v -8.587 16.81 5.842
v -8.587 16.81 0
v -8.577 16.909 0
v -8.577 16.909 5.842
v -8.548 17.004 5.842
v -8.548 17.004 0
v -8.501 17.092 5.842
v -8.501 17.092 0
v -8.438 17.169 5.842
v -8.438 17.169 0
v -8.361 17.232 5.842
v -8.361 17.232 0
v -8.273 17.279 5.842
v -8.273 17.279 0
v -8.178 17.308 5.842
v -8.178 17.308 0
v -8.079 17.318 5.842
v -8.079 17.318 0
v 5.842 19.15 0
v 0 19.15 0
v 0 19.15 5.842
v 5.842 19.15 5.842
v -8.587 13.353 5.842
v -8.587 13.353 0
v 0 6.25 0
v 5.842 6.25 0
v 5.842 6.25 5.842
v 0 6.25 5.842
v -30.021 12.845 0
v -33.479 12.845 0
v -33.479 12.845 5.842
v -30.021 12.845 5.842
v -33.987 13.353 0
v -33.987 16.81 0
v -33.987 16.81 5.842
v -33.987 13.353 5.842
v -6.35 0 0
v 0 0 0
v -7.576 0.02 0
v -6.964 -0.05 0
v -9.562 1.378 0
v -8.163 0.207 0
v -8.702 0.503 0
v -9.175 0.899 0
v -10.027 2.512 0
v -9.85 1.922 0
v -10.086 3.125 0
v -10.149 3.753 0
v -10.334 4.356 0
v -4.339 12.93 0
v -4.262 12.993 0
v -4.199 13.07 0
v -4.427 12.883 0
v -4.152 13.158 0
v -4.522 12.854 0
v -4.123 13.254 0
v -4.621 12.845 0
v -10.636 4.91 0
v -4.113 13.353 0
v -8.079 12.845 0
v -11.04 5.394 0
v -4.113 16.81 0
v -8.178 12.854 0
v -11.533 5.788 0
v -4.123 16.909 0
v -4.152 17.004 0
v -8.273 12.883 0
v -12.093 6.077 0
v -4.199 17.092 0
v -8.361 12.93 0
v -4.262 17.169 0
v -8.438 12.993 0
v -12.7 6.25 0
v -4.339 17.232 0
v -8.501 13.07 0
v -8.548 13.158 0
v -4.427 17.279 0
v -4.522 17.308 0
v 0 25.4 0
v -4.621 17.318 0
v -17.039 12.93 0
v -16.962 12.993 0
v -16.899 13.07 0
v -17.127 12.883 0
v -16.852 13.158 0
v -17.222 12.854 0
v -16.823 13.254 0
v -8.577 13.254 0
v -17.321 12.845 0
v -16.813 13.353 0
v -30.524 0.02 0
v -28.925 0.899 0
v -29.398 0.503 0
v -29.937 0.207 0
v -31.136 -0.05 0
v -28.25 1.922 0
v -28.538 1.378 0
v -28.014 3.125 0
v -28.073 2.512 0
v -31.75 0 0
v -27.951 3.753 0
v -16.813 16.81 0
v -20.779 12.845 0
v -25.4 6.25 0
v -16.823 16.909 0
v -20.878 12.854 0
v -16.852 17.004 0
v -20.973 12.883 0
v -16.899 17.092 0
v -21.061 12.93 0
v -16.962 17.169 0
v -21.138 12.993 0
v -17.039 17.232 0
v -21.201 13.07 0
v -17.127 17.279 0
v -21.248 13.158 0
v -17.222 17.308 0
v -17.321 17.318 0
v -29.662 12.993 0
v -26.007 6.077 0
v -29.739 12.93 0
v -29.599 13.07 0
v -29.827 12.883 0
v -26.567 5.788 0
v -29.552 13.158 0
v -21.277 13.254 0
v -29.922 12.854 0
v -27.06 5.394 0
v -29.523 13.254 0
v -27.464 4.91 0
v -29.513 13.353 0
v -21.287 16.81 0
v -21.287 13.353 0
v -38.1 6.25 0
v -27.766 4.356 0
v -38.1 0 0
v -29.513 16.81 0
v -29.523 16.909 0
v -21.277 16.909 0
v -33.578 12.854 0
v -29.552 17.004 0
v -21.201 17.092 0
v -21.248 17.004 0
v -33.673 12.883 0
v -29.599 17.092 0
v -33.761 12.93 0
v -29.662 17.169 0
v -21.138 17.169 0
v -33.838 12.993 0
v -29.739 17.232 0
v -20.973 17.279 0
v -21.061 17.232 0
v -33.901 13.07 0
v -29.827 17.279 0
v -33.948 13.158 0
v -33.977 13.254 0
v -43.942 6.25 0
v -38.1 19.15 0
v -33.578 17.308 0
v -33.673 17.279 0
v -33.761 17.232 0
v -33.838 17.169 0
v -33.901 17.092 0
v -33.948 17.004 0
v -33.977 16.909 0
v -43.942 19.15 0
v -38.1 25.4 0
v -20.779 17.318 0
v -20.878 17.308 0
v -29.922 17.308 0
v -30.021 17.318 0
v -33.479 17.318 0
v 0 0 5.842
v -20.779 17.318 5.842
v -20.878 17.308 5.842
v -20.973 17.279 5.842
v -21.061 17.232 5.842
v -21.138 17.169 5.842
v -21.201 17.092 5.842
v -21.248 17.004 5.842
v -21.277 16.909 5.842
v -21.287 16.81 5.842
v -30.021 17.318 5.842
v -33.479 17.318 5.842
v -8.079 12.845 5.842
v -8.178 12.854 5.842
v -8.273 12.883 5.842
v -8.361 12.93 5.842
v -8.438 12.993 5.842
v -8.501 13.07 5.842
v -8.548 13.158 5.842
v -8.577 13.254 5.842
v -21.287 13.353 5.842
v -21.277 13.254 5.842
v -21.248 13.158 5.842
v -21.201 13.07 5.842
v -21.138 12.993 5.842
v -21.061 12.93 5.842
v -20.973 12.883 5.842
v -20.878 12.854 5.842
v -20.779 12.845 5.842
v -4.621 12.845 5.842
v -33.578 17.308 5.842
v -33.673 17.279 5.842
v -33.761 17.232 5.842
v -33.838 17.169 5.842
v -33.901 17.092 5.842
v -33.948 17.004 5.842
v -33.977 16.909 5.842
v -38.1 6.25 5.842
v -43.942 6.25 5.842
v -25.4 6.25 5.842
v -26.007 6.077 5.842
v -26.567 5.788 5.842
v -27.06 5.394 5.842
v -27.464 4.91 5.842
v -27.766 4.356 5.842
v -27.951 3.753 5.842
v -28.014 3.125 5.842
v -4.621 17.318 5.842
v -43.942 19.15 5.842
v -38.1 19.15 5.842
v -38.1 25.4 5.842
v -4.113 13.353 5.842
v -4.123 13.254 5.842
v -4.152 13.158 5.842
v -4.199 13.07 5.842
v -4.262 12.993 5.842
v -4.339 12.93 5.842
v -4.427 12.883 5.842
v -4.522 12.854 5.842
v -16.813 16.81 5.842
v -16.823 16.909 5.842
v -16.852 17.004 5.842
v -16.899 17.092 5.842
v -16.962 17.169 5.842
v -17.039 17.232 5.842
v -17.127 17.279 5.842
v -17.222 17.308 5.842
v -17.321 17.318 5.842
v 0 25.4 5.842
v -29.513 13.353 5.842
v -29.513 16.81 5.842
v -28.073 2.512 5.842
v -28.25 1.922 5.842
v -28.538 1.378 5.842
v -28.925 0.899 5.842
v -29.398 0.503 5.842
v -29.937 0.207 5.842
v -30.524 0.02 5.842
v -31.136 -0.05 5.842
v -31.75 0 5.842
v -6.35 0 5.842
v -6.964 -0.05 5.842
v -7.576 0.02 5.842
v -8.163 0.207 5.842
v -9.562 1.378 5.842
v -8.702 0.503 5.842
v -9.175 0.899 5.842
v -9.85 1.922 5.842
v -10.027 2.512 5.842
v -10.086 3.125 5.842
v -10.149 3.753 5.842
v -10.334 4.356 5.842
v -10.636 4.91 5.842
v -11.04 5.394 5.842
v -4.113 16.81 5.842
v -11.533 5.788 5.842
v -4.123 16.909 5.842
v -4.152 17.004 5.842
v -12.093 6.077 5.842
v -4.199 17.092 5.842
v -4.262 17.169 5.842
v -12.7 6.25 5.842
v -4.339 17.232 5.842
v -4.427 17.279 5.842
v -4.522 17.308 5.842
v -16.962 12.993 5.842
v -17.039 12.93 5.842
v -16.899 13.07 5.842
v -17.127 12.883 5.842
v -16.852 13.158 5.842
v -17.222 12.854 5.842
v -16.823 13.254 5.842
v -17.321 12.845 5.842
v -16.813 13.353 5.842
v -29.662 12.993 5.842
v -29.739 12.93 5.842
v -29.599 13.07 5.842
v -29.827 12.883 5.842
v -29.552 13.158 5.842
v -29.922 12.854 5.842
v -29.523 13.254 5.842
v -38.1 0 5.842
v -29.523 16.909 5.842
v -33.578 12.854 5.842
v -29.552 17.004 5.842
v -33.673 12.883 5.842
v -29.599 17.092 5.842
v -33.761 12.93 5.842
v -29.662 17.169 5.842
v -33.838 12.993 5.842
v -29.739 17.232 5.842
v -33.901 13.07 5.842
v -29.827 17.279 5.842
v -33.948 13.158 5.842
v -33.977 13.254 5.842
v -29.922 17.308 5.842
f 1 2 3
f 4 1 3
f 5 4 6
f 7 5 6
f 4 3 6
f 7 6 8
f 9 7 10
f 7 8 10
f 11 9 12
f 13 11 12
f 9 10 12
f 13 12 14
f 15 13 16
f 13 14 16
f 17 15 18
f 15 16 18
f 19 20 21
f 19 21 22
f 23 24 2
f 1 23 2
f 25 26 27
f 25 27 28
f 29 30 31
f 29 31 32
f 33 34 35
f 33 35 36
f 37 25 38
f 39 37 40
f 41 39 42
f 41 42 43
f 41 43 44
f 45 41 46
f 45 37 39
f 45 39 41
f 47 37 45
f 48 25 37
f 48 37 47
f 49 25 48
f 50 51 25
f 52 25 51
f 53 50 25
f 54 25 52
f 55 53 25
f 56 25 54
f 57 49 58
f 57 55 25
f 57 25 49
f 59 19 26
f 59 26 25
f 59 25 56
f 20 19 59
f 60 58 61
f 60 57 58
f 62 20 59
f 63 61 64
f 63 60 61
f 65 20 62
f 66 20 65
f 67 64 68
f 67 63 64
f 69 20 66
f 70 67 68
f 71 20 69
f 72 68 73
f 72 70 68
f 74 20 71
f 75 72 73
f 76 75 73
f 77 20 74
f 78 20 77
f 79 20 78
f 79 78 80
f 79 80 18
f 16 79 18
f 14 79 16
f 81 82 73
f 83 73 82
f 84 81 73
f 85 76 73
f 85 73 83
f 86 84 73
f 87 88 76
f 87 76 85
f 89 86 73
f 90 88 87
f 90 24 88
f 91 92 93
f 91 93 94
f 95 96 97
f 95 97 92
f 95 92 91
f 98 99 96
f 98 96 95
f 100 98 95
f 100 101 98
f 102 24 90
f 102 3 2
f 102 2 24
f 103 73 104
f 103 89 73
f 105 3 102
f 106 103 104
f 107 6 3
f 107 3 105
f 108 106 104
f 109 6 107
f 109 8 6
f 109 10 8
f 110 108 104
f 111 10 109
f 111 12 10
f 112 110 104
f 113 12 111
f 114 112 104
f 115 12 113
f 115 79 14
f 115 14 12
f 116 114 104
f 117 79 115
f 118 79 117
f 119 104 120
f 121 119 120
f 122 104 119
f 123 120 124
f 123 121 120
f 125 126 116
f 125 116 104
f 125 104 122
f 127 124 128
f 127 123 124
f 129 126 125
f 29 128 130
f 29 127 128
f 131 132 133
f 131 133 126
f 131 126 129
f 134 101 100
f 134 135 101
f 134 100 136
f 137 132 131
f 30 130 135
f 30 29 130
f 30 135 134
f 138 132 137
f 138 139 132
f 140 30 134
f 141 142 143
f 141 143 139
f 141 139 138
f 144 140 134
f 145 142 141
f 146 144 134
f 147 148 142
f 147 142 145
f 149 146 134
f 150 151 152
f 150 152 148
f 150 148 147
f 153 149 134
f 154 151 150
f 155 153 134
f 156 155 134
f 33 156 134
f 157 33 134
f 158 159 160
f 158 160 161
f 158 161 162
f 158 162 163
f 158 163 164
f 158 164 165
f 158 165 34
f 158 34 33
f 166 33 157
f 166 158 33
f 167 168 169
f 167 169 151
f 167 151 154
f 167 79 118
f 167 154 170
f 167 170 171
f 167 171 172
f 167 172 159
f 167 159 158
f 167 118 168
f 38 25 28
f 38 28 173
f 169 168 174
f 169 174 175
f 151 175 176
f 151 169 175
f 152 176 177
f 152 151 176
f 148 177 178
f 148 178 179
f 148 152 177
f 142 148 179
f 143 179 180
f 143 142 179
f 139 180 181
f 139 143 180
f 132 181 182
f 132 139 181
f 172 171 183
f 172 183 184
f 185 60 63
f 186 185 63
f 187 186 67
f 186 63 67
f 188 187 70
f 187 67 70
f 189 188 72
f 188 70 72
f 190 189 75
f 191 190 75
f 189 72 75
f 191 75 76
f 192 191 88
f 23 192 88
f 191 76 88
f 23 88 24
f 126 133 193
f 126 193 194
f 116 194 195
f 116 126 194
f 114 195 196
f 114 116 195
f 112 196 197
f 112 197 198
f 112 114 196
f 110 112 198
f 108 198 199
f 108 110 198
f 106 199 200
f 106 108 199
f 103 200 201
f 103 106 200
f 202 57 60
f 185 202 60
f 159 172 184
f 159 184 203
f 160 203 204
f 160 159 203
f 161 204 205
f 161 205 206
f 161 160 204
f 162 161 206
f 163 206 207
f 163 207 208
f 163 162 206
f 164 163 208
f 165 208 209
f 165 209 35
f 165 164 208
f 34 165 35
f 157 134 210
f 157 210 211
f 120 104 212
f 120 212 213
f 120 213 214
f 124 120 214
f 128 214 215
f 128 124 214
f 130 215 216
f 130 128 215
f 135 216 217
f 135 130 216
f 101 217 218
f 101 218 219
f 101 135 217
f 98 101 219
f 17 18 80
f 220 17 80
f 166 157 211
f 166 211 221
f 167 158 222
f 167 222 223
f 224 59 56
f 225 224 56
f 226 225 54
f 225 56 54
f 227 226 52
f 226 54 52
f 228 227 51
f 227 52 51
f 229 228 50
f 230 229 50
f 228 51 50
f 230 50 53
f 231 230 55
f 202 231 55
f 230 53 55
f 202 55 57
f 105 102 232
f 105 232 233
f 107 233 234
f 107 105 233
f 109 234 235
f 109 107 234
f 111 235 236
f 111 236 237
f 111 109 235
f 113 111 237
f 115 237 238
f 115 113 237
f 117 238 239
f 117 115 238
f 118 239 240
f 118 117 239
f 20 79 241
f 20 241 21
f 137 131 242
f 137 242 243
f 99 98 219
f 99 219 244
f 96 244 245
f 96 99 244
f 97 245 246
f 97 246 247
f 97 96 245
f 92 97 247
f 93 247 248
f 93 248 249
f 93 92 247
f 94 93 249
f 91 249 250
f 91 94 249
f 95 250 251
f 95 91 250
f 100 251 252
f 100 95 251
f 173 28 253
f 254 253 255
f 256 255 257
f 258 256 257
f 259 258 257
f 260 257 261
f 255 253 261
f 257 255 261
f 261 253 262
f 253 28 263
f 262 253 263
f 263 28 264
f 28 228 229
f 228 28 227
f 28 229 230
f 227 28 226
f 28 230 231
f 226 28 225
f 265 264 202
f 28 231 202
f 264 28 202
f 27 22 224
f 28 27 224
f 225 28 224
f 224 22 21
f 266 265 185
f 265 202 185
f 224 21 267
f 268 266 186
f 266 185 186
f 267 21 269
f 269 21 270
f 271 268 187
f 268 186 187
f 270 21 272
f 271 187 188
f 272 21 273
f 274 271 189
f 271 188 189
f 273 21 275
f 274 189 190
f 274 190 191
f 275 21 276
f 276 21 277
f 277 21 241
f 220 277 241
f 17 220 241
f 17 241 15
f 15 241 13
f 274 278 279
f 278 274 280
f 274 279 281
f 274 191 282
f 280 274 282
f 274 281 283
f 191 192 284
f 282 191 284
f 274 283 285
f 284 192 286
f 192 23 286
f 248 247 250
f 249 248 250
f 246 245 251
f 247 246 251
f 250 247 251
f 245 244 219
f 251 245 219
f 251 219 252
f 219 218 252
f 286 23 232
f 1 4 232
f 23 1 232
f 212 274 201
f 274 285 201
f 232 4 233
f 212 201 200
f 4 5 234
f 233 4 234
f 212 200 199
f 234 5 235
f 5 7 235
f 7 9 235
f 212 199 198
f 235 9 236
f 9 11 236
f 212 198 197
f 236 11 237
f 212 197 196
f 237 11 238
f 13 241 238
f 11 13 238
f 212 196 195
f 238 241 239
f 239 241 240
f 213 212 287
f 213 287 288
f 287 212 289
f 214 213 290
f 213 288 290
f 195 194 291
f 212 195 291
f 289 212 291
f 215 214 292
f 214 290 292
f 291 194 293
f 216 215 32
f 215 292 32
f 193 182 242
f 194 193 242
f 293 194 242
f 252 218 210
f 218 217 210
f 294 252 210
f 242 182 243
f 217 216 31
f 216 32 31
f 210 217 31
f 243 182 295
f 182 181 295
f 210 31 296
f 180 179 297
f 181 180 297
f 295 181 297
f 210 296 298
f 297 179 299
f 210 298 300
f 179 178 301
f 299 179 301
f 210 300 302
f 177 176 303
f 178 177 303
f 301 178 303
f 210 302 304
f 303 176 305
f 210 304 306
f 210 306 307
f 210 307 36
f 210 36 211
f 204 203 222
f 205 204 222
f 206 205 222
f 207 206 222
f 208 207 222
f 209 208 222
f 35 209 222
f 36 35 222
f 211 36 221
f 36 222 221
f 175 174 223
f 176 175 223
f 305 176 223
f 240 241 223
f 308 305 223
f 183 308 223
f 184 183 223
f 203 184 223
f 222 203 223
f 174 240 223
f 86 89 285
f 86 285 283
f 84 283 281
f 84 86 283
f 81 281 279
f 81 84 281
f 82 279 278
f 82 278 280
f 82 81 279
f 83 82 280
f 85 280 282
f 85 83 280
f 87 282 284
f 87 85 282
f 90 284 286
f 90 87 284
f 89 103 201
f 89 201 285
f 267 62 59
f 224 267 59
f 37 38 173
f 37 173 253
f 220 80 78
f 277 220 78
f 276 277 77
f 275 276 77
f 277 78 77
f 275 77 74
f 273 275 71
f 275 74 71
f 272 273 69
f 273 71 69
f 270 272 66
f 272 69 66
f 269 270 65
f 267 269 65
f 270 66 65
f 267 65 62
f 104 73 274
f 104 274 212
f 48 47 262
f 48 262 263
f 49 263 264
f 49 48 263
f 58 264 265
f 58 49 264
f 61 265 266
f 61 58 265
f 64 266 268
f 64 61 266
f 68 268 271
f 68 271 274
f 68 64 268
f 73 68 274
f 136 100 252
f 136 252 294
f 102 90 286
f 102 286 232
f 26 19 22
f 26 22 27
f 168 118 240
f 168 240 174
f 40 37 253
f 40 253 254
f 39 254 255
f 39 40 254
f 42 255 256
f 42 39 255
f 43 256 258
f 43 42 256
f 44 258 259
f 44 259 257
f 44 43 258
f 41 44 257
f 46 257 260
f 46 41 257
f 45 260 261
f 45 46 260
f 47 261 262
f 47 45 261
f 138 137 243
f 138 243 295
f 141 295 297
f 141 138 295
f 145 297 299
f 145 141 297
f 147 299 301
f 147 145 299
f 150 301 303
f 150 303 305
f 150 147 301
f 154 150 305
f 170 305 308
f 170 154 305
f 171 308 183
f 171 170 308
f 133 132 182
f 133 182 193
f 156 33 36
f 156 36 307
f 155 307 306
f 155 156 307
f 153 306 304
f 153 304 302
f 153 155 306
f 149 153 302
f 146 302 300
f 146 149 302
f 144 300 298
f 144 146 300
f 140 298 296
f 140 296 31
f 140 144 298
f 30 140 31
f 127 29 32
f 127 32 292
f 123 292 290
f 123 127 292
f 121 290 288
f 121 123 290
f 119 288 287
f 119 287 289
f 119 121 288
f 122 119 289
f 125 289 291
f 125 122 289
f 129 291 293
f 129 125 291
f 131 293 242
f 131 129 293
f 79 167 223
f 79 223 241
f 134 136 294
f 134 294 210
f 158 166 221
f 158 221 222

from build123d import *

# Parameters (mm, degrees)
BOSS_EXTRUDE1_DEPTH = 5.842


with BuildPart() as part:
    # Sketch1 → Boss-Extrude1 (new body)
    with BuildSketch(Plane.XY):
        with BuildLine():
            Line((0, 0), (-6.35, 0))
            ThreePointArc((-6.35, 0), (-8.948239117, 0.689575054), (-10.086248608, 3.125))
            ThreePointArc((-10.086248608, 3.125), (-10.825823663, 5.161990509), (-12.7, 6.25))
            Line((-12.7, 6.25), (-25.4, 6.25))
            ThreePointArc((-25.4, 6.25), (-27.274176337, 5.161990509), (-28.013751392, 3.125))
            ThreePointArc((-28.013751392, 3.125), (-29.151760883, 0.689575054), (-31.75, 0))
            Line((-31.75, 0), (-38.1, 0))
            Line((-38.1, 0), (-38.1, 6.25))
            Line((-38.1, 6.25), (-43.942, 6.25))
            Line((-43.942, 6.25), (-43.942, 19.15))
            Line((-43.942, 19.15), (-38.1, 19.15))
            Line((-38.1, 19.15), (-38.1, 25.4))
            Line((-38.1, 25.4), (0, 25.4))
            Line((0, 25.4), (0, 19.15))
            Line((0, 19.15), (5.842, 19.15))
            Line((5.842, 19.15), (5.842, 6.25))
            Line((5.842, 6.25), (0, 6.25))
            Line((0, 6.25), (0, 0))
        make_face()
        with BuildLine():
            Line((-4.621403, 12.844653), (-8.078597, 12.844653))
            ThreePointArc((-8.078597, 12.844653), (-8.437807245, 12.993442755), (-8.586597, 13.352653))
            Line((-8.586597, 13.352653), (-8.586597, 16.809847))
            ThreePointArc((-8.586597, 16.809847), (-8.437807245, 17.169057245), (-8.078597, 17.317847))
            Line((-8.078597, 17.317847), (-4.621403, 17.317847))
            ThreePointArc((-4.621403, 17.317847), (-4.262192755, 17.169057245), (-4.113403, 16.809847))
            Line((-4.113403, 16.809847), (-4.113403, 13.352653))
            ThreePointArc((-4.113403, 13.352653), (-4.262192755, 12.993442755), (-4.621403, 12.844653))
        make_face(mode=Mode.SUBTRACT)
        with BuildLine():
            Line((-16.813403, 13.352653), (-16.813403, 16.809847))
            ThreePointArc((-16.813403, 16.809847), (-16.962192755, 17.169057245), (-17.321403, 17.317847))
            Line((-17.321403, 17.317847), (-20.778597, 17.317847))
            ThreePointArc((-20.778597, 17.317847), (-21.137807245, 17.169057245), (-21.286597, 16.809847))
            Line((-21.286597, 16.809847), (-21.286597, 13.352653))
            ThreePointArc((-21.286597, 13.352653), (-21.137807245, 12.993442755), (-20.778597, 12.844653))
            Line((-20.778597, 12.844653), (-17.321403, 12.844653))
            ThreePointArc((-17.321403, 12.844653), (-16.962192755, 12.993442755), (-16.813403, 13.352653))
        make_face(mode=Mode.SUBTRACT)
        with BuildLine():
            Line((-29.513403, 13.352653), (-29.513403, 16.809847))
            ThreePointArc((-29.513403, 16.809847), (-29.662192755, 17.169057245), (-30.021403, 17.317847))
            Line((-30.021403, 17.317847), (-33.478597, 17.317847))
            ThreePointArc((-33.478597, 17.317847), (-33.837807245, 17.169057245), (-33.986597, 16.809847))
            Line((-33.986597, 16.809847), (-33.986597, 13.352653))
            ThreePointArc((-33.986597, 13.352653), (-33.837807245, 12.993442755), (-33.478597, 12.844653))
            Line((-33.478597, 12.844653), (-30.021403, 12.844653))
            ThreePointArc((-30.021403, 12.844653), (-29.662192755, 12.993442755), (-29.513403, 13.352653))
        make_face(mode=Mode.SUBTRACT)
    extrude(amount=BOSS_EXTRUDE1_DEPTH)


solid = part.part
